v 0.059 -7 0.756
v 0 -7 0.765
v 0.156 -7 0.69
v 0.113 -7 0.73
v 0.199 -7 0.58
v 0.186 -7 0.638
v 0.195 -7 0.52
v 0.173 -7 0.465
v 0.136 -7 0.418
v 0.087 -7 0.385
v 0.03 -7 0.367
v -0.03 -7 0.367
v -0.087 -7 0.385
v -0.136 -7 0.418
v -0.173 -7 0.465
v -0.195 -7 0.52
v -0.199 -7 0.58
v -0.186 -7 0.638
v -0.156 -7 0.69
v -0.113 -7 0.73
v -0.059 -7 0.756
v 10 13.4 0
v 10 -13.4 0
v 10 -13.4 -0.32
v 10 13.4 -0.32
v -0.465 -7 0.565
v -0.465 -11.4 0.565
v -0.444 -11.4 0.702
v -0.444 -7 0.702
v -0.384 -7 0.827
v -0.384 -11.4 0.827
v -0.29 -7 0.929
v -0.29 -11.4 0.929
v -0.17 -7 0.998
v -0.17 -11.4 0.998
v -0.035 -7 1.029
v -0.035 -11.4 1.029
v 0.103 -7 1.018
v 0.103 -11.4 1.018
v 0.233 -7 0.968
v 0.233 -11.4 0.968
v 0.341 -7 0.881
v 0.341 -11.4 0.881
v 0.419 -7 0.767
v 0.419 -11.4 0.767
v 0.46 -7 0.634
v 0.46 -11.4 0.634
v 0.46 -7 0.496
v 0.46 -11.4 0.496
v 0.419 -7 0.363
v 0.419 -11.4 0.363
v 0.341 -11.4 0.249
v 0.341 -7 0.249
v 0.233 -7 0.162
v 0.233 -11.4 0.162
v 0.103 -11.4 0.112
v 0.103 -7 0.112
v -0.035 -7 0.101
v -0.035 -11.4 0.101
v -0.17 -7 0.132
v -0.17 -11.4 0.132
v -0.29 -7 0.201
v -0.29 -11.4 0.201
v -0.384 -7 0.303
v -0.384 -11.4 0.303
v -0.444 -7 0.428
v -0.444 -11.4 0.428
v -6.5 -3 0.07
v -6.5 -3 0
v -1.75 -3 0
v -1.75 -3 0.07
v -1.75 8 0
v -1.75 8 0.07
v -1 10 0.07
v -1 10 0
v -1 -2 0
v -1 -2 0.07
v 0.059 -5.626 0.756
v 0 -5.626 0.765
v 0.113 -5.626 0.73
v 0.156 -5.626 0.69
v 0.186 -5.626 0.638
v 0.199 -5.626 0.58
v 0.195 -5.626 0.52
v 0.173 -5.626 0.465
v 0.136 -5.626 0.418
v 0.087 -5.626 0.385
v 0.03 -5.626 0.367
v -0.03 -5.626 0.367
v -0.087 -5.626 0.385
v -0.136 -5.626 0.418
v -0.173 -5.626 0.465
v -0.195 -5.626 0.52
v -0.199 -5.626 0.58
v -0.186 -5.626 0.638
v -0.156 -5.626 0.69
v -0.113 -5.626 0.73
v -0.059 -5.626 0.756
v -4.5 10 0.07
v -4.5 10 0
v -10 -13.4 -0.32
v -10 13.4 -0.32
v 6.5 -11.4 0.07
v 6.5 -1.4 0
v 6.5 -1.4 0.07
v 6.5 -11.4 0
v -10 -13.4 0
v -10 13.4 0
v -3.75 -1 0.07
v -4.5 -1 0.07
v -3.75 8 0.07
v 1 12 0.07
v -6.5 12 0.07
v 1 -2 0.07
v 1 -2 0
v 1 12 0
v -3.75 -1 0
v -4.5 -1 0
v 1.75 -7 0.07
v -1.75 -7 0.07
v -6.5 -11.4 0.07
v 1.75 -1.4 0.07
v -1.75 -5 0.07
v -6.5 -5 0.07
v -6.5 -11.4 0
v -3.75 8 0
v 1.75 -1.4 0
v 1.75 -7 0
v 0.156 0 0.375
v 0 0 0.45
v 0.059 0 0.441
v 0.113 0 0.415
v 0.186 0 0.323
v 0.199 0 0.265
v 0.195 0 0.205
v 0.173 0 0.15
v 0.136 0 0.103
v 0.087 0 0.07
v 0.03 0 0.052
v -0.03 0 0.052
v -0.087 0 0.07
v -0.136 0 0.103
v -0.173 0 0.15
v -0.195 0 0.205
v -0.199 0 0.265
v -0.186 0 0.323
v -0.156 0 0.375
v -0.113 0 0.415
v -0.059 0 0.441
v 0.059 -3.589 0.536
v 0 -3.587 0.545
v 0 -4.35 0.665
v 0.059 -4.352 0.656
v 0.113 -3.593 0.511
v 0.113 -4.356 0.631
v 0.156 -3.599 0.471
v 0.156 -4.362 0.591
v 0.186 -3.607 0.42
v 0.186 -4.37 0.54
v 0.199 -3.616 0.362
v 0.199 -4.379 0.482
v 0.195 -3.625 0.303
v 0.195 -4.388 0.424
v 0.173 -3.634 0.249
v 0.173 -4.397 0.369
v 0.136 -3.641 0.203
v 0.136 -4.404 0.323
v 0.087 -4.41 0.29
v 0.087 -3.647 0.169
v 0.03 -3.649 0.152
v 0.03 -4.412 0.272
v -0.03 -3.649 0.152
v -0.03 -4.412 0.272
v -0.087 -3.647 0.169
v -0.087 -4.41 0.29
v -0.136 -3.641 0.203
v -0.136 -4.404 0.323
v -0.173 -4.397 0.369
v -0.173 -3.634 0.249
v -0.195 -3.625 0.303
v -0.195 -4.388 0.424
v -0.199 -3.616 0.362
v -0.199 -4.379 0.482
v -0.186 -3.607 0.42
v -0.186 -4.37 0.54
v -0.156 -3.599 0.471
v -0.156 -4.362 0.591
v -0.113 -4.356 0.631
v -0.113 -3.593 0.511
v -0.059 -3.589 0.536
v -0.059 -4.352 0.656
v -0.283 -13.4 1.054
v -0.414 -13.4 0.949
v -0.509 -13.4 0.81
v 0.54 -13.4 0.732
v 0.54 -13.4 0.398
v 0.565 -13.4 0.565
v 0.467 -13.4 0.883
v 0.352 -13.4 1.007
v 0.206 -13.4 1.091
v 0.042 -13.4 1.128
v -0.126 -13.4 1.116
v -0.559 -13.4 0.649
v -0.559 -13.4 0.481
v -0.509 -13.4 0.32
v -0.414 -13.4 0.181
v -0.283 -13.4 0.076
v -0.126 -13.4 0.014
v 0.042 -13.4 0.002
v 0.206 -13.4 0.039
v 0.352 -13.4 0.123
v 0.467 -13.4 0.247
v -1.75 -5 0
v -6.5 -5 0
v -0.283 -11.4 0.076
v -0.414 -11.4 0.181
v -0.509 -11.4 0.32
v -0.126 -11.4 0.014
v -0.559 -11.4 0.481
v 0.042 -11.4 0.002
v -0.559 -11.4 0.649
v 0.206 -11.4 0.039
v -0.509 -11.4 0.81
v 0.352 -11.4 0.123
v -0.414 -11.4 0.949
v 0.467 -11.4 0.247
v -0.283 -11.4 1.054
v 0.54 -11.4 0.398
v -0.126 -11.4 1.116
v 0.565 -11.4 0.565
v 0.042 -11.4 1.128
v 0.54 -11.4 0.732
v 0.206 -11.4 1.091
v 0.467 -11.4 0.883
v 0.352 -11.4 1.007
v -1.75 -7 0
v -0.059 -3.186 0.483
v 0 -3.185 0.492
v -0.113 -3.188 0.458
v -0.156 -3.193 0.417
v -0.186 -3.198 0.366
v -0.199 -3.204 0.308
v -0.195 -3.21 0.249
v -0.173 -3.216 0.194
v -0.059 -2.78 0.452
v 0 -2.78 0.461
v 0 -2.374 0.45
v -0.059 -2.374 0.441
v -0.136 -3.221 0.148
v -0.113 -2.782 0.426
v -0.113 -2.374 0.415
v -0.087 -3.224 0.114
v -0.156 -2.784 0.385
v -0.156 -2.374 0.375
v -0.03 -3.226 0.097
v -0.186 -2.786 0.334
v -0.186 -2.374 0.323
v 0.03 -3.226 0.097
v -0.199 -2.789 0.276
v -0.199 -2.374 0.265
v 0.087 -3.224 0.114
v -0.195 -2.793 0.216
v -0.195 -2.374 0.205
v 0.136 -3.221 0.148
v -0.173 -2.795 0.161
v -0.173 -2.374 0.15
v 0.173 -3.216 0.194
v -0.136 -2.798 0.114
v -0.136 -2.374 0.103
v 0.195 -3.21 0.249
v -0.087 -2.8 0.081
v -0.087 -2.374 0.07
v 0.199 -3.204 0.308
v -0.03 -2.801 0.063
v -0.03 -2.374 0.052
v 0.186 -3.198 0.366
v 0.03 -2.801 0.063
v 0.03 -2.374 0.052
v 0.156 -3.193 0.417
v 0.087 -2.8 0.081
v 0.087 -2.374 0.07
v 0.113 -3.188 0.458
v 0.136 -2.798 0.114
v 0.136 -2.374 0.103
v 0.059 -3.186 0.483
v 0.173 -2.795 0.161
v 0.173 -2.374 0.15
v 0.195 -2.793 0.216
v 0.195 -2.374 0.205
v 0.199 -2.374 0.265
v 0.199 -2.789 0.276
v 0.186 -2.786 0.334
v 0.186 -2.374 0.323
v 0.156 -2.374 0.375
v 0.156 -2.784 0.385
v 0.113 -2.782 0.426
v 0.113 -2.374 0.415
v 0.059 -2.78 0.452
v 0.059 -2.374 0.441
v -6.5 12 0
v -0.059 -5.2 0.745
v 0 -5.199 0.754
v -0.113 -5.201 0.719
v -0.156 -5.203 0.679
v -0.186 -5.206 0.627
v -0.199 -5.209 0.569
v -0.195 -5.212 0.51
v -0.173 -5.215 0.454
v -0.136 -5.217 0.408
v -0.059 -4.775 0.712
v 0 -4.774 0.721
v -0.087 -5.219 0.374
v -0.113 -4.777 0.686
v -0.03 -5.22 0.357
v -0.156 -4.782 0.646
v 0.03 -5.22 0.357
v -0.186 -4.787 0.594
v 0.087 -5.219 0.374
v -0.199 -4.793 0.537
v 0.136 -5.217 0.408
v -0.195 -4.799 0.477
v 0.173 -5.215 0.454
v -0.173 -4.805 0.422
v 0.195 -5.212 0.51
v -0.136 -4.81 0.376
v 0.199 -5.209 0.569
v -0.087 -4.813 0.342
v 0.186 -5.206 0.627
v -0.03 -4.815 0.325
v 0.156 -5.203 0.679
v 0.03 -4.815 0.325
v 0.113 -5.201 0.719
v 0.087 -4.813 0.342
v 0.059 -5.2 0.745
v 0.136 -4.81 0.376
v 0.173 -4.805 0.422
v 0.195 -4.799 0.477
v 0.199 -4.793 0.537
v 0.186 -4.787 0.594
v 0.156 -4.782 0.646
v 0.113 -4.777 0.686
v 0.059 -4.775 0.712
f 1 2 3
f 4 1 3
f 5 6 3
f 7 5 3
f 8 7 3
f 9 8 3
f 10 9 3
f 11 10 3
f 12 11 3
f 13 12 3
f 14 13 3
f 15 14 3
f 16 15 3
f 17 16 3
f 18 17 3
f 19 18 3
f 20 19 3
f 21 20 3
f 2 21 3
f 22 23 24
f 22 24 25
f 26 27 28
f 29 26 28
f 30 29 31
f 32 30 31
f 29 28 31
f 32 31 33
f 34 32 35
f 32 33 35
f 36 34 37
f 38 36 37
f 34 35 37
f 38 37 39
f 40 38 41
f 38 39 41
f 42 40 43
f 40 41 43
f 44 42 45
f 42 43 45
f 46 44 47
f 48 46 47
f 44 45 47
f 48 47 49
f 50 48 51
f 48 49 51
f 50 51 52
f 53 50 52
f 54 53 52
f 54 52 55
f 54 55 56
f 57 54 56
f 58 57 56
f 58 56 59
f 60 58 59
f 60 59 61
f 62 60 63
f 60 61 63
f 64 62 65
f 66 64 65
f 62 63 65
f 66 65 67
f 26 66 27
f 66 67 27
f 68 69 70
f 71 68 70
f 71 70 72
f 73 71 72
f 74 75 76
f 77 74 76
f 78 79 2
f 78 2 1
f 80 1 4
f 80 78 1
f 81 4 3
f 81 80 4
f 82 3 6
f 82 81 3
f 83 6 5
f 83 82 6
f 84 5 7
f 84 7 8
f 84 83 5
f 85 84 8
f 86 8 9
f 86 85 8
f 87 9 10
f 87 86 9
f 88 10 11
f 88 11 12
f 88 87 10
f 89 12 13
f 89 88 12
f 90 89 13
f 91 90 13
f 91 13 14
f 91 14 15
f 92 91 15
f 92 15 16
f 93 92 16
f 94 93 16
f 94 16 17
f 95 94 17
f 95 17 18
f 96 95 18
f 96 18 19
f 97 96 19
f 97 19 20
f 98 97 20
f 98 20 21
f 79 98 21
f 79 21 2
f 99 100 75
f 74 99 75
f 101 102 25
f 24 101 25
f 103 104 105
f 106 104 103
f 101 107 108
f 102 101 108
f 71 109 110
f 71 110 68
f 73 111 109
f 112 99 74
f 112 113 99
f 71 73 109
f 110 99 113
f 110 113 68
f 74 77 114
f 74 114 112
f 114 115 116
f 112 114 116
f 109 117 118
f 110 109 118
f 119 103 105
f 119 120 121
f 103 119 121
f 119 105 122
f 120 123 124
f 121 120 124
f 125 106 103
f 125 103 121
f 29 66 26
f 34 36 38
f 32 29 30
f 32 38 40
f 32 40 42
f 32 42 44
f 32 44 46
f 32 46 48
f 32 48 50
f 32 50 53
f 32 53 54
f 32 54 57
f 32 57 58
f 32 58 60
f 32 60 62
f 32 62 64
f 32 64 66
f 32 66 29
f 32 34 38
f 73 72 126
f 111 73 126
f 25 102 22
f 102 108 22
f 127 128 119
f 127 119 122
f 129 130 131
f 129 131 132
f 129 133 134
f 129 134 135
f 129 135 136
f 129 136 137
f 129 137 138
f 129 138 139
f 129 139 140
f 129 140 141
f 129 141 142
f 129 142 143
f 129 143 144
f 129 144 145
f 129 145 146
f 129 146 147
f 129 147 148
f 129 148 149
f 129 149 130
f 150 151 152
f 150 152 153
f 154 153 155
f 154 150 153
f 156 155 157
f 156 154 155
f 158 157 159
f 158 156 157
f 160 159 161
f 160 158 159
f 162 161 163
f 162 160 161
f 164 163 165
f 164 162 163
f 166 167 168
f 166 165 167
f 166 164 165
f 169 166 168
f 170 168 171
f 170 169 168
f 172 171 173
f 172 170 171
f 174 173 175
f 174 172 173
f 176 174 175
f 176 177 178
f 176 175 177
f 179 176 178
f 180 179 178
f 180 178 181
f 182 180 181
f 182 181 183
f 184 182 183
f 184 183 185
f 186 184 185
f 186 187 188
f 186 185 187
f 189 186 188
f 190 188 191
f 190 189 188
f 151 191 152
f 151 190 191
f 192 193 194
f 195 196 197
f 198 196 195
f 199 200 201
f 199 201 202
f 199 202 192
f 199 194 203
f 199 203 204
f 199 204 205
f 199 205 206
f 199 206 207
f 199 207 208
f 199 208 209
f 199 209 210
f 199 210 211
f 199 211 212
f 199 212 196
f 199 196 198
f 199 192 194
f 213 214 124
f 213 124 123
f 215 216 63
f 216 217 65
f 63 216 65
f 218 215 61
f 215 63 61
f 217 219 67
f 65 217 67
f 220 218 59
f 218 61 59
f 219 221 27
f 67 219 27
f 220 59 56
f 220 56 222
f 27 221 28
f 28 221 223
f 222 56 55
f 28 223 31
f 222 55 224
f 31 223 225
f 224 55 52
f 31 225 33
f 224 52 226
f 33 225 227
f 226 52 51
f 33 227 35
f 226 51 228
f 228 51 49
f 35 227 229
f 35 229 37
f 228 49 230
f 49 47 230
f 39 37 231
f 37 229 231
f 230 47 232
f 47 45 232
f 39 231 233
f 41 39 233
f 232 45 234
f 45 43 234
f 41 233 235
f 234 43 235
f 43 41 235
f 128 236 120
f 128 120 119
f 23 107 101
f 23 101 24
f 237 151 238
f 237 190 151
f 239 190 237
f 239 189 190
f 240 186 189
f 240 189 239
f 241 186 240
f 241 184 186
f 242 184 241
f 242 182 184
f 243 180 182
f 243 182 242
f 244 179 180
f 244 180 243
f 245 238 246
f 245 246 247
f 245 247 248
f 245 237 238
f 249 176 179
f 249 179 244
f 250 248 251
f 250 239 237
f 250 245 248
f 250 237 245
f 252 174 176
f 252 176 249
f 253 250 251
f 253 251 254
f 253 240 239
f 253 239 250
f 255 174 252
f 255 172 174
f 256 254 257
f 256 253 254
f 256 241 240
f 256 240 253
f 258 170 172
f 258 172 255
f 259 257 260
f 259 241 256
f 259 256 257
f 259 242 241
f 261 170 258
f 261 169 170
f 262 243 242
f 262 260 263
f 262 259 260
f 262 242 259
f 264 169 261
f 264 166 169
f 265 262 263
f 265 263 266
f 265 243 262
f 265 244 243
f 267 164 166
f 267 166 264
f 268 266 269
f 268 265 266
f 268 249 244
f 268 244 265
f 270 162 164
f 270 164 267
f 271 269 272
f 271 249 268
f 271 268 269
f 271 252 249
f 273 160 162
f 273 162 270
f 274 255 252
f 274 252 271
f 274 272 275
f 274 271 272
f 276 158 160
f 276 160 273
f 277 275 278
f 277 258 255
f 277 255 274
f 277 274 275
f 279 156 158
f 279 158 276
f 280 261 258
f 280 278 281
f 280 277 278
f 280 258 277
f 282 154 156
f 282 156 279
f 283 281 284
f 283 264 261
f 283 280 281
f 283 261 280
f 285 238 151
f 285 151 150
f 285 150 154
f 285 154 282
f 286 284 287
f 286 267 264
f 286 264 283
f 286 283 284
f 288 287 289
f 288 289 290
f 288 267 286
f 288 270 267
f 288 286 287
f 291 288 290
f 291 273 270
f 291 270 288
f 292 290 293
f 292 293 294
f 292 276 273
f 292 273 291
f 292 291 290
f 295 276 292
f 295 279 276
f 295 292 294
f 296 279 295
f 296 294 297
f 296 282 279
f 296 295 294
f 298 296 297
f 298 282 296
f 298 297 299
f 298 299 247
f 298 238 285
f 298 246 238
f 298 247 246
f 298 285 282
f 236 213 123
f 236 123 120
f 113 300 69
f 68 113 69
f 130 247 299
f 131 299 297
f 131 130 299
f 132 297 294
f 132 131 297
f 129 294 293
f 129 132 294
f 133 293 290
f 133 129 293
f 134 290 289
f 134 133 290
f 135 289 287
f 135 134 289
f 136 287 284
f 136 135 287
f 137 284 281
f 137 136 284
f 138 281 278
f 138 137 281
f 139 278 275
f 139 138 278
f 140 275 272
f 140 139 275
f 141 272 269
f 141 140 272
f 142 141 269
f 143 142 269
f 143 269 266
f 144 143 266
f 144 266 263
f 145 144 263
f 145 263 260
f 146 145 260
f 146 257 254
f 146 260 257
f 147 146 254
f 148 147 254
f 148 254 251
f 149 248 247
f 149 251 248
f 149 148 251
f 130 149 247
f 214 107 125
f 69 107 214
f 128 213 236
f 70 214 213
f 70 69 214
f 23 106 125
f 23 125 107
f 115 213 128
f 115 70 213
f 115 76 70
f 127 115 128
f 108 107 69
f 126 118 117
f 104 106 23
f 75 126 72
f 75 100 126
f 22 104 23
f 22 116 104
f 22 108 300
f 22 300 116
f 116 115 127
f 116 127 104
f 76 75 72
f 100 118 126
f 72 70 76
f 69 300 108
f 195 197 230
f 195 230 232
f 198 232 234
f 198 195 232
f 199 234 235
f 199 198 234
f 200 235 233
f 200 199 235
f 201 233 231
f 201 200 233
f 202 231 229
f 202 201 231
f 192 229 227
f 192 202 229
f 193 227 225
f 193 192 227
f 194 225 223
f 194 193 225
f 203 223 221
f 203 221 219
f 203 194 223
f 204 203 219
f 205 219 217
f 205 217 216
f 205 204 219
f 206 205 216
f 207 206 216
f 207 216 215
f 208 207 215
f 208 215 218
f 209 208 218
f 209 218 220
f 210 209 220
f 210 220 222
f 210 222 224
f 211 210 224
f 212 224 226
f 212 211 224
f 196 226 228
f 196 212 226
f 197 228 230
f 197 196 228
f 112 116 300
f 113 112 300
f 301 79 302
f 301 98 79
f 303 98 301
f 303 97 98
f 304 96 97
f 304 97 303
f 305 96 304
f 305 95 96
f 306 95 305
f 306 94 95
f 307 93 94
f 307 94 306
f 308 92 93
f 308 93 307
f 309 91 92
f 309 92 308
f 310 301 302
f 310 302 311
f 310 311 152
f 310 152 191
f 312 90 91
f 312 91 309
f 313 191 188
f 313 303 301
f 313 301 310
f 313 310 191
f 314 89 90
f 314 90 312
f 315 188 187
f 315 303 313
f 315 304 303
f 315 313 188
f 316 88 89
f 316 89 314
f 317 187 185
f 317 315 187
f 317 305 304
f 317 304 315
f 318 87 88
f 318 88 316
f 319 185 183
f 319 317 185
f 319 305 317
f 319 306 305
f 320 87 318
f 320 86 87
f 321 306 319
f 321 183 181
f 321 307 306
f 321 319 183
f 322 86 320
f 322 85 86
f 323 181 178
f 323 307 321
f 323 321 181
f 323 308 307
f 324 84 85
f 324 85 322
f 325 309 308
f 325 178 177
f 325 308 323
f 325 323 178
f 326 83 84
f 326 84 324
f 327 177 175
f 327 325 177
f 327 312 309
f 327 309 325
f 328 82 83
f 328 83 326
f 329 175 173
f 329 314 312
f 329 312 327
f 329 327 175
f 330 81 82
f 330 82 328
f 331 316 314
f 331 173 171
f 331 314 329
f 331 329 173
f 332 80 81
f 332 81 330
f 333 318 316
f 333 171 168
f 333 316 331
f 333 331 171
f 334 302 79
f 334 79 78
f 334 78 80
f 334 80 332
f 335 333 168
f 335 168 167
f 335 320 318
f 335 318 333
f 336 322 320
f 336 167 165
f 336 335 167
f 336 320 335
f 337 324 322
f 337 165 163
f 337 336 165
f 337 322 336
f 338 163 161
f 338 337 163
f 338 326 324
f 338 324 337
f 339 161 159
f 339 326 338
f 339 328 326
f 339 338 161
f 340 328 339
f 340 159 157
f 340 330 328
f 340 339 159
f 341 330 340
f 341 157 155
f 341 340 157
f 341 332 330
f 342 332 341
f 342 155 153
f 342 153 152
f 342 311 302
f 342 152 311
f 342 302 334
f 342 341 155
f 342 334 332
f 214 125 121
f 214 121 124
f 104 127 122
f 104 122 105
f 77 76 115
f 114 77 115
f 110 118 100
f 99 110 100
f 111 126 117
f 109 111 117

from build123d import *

# Parameters (mm, degrees)
SKETCH1_W           = 20
SKETCH1_H           = 26.8
BOSS_EXTRUDE1_DEPTH = 0.17
BOSS_EXTRUDE2_START = -0.17
SKETCH1_2_W         = 20
SKETCH1_2_H         = 26.8
BOSS_EXTRUDE2_DEPTH = 0.15
BOSS_EXTRUDE3_DEPTH = 0.07
SKETCH3_R           = 0.565
BOSS_EXTRUDE8_DEPTH = 2
SKETCH4_R           = 0.465
BOSS_EXTRUDE9_DEPTH = 4.4
SWEEP4_PROFILE_R    = 0.2


with BuildPart() as part:
    # Sketch1 → Boss-Extrude1 (new body)
    with BuildSketch(Plane.XY):
        Rectangle(SKETCH1_W, SKETCH1_H)
    extrude(amount=-BOSS_EXTRUDE1_DEPTH)

    # Sketch1<2> → Boss-Extrude2 (add)
    with BuildSketch(Plane.XY.offset(BOSS_EXTRUDE2_START)):
        Rectangle(SKETCH1_2_W, SKETCH1_2_H)
    extrude(amount=-BOSS_EXTRUDE2_DEPTH)

    # Sketch2 → Boss-Extrude3 (add)
    with BuildSketch(Plane.XY):
        Polygon((1, -2), (1, 12), (-6.5, 12), (-6.5, -3), (-1.75, -3), (-1.75, 8), (-3.75, 8), (-3.75, -1), (-4.5, -1), (-4.5, 10), (-1, 10), (-1, -2), align=None)
        Polygon((-6.5, -5), (-1.75, -5), (-1.75, -7), (1.75, -7), (1.75, -1.4), (6.5, -1.4), (6.5, -11.4), (-6.5, -11.4), align=None)
    extrude(amount=BOSS_EXTRUDE3_DEPTH)


with BuildPart() as body_2:
    # Sketch3 → Boss-Extrude8 (new body)
    with BuildSketch(Plane.XZ.offset(13.4)):
        with Locations((0, 0.565)):
            Circle(SKETCH3_R)
    extrude(amount=-BOSS_EXTRUDE8_DEPTH)

    # Sketch4 → Boss-Extrude9 (add)
    with BuildSketch(Plane(origin=(0, -11.4, 0), x_dir=(1, 0, 0), z_dir=(0, 1, 0))):
        with Locations(Location((0, -0.565, 0), (0, 0, 180))):
            Circle(SKETCH4_R)
    extrude(amount=BOSS_EXTRUDE9_DEPTH)


with BuildPart() as body_3:
    # Sweep4: sweep along a path in Sketch5
    with BuildLine(Plane(origin=(0, 0, 0), x_dir=(0, 0, -1), z_dir=(1, 0, 0))) as sweep4_path:
        Line((-0.565, -7), (-0.565, -5.626140736))
        ThreePointArc((-0.565, -5.626140736), (-0.540608741, -5.001909045), (-0.467583699, -4.381483803))
        Line((-0.467583699, -4.381483803), (-0.347416301, -3.618516197))
        ThreePointArc((-0.347416301, -3.618516197), (-0.274391259, -2.998090955), (-0.25, -2.373859264))
        Line((-0.25, -2.373859264), (-0.25, 0))
    # Sweep4 profile (on start of the path) → Sweep4 (sweep)
    with BuildSketch(Plane(origin=(0, -7, 0.565), x_dir=(0, 0, 1), z_dir=(0, 1, 0))):
        Circle(SWEEP4_PROFILE_R)
    sweep(path=sweep4_path.line)


solid = Compound([part.part, body_2.part, body_3.part])
